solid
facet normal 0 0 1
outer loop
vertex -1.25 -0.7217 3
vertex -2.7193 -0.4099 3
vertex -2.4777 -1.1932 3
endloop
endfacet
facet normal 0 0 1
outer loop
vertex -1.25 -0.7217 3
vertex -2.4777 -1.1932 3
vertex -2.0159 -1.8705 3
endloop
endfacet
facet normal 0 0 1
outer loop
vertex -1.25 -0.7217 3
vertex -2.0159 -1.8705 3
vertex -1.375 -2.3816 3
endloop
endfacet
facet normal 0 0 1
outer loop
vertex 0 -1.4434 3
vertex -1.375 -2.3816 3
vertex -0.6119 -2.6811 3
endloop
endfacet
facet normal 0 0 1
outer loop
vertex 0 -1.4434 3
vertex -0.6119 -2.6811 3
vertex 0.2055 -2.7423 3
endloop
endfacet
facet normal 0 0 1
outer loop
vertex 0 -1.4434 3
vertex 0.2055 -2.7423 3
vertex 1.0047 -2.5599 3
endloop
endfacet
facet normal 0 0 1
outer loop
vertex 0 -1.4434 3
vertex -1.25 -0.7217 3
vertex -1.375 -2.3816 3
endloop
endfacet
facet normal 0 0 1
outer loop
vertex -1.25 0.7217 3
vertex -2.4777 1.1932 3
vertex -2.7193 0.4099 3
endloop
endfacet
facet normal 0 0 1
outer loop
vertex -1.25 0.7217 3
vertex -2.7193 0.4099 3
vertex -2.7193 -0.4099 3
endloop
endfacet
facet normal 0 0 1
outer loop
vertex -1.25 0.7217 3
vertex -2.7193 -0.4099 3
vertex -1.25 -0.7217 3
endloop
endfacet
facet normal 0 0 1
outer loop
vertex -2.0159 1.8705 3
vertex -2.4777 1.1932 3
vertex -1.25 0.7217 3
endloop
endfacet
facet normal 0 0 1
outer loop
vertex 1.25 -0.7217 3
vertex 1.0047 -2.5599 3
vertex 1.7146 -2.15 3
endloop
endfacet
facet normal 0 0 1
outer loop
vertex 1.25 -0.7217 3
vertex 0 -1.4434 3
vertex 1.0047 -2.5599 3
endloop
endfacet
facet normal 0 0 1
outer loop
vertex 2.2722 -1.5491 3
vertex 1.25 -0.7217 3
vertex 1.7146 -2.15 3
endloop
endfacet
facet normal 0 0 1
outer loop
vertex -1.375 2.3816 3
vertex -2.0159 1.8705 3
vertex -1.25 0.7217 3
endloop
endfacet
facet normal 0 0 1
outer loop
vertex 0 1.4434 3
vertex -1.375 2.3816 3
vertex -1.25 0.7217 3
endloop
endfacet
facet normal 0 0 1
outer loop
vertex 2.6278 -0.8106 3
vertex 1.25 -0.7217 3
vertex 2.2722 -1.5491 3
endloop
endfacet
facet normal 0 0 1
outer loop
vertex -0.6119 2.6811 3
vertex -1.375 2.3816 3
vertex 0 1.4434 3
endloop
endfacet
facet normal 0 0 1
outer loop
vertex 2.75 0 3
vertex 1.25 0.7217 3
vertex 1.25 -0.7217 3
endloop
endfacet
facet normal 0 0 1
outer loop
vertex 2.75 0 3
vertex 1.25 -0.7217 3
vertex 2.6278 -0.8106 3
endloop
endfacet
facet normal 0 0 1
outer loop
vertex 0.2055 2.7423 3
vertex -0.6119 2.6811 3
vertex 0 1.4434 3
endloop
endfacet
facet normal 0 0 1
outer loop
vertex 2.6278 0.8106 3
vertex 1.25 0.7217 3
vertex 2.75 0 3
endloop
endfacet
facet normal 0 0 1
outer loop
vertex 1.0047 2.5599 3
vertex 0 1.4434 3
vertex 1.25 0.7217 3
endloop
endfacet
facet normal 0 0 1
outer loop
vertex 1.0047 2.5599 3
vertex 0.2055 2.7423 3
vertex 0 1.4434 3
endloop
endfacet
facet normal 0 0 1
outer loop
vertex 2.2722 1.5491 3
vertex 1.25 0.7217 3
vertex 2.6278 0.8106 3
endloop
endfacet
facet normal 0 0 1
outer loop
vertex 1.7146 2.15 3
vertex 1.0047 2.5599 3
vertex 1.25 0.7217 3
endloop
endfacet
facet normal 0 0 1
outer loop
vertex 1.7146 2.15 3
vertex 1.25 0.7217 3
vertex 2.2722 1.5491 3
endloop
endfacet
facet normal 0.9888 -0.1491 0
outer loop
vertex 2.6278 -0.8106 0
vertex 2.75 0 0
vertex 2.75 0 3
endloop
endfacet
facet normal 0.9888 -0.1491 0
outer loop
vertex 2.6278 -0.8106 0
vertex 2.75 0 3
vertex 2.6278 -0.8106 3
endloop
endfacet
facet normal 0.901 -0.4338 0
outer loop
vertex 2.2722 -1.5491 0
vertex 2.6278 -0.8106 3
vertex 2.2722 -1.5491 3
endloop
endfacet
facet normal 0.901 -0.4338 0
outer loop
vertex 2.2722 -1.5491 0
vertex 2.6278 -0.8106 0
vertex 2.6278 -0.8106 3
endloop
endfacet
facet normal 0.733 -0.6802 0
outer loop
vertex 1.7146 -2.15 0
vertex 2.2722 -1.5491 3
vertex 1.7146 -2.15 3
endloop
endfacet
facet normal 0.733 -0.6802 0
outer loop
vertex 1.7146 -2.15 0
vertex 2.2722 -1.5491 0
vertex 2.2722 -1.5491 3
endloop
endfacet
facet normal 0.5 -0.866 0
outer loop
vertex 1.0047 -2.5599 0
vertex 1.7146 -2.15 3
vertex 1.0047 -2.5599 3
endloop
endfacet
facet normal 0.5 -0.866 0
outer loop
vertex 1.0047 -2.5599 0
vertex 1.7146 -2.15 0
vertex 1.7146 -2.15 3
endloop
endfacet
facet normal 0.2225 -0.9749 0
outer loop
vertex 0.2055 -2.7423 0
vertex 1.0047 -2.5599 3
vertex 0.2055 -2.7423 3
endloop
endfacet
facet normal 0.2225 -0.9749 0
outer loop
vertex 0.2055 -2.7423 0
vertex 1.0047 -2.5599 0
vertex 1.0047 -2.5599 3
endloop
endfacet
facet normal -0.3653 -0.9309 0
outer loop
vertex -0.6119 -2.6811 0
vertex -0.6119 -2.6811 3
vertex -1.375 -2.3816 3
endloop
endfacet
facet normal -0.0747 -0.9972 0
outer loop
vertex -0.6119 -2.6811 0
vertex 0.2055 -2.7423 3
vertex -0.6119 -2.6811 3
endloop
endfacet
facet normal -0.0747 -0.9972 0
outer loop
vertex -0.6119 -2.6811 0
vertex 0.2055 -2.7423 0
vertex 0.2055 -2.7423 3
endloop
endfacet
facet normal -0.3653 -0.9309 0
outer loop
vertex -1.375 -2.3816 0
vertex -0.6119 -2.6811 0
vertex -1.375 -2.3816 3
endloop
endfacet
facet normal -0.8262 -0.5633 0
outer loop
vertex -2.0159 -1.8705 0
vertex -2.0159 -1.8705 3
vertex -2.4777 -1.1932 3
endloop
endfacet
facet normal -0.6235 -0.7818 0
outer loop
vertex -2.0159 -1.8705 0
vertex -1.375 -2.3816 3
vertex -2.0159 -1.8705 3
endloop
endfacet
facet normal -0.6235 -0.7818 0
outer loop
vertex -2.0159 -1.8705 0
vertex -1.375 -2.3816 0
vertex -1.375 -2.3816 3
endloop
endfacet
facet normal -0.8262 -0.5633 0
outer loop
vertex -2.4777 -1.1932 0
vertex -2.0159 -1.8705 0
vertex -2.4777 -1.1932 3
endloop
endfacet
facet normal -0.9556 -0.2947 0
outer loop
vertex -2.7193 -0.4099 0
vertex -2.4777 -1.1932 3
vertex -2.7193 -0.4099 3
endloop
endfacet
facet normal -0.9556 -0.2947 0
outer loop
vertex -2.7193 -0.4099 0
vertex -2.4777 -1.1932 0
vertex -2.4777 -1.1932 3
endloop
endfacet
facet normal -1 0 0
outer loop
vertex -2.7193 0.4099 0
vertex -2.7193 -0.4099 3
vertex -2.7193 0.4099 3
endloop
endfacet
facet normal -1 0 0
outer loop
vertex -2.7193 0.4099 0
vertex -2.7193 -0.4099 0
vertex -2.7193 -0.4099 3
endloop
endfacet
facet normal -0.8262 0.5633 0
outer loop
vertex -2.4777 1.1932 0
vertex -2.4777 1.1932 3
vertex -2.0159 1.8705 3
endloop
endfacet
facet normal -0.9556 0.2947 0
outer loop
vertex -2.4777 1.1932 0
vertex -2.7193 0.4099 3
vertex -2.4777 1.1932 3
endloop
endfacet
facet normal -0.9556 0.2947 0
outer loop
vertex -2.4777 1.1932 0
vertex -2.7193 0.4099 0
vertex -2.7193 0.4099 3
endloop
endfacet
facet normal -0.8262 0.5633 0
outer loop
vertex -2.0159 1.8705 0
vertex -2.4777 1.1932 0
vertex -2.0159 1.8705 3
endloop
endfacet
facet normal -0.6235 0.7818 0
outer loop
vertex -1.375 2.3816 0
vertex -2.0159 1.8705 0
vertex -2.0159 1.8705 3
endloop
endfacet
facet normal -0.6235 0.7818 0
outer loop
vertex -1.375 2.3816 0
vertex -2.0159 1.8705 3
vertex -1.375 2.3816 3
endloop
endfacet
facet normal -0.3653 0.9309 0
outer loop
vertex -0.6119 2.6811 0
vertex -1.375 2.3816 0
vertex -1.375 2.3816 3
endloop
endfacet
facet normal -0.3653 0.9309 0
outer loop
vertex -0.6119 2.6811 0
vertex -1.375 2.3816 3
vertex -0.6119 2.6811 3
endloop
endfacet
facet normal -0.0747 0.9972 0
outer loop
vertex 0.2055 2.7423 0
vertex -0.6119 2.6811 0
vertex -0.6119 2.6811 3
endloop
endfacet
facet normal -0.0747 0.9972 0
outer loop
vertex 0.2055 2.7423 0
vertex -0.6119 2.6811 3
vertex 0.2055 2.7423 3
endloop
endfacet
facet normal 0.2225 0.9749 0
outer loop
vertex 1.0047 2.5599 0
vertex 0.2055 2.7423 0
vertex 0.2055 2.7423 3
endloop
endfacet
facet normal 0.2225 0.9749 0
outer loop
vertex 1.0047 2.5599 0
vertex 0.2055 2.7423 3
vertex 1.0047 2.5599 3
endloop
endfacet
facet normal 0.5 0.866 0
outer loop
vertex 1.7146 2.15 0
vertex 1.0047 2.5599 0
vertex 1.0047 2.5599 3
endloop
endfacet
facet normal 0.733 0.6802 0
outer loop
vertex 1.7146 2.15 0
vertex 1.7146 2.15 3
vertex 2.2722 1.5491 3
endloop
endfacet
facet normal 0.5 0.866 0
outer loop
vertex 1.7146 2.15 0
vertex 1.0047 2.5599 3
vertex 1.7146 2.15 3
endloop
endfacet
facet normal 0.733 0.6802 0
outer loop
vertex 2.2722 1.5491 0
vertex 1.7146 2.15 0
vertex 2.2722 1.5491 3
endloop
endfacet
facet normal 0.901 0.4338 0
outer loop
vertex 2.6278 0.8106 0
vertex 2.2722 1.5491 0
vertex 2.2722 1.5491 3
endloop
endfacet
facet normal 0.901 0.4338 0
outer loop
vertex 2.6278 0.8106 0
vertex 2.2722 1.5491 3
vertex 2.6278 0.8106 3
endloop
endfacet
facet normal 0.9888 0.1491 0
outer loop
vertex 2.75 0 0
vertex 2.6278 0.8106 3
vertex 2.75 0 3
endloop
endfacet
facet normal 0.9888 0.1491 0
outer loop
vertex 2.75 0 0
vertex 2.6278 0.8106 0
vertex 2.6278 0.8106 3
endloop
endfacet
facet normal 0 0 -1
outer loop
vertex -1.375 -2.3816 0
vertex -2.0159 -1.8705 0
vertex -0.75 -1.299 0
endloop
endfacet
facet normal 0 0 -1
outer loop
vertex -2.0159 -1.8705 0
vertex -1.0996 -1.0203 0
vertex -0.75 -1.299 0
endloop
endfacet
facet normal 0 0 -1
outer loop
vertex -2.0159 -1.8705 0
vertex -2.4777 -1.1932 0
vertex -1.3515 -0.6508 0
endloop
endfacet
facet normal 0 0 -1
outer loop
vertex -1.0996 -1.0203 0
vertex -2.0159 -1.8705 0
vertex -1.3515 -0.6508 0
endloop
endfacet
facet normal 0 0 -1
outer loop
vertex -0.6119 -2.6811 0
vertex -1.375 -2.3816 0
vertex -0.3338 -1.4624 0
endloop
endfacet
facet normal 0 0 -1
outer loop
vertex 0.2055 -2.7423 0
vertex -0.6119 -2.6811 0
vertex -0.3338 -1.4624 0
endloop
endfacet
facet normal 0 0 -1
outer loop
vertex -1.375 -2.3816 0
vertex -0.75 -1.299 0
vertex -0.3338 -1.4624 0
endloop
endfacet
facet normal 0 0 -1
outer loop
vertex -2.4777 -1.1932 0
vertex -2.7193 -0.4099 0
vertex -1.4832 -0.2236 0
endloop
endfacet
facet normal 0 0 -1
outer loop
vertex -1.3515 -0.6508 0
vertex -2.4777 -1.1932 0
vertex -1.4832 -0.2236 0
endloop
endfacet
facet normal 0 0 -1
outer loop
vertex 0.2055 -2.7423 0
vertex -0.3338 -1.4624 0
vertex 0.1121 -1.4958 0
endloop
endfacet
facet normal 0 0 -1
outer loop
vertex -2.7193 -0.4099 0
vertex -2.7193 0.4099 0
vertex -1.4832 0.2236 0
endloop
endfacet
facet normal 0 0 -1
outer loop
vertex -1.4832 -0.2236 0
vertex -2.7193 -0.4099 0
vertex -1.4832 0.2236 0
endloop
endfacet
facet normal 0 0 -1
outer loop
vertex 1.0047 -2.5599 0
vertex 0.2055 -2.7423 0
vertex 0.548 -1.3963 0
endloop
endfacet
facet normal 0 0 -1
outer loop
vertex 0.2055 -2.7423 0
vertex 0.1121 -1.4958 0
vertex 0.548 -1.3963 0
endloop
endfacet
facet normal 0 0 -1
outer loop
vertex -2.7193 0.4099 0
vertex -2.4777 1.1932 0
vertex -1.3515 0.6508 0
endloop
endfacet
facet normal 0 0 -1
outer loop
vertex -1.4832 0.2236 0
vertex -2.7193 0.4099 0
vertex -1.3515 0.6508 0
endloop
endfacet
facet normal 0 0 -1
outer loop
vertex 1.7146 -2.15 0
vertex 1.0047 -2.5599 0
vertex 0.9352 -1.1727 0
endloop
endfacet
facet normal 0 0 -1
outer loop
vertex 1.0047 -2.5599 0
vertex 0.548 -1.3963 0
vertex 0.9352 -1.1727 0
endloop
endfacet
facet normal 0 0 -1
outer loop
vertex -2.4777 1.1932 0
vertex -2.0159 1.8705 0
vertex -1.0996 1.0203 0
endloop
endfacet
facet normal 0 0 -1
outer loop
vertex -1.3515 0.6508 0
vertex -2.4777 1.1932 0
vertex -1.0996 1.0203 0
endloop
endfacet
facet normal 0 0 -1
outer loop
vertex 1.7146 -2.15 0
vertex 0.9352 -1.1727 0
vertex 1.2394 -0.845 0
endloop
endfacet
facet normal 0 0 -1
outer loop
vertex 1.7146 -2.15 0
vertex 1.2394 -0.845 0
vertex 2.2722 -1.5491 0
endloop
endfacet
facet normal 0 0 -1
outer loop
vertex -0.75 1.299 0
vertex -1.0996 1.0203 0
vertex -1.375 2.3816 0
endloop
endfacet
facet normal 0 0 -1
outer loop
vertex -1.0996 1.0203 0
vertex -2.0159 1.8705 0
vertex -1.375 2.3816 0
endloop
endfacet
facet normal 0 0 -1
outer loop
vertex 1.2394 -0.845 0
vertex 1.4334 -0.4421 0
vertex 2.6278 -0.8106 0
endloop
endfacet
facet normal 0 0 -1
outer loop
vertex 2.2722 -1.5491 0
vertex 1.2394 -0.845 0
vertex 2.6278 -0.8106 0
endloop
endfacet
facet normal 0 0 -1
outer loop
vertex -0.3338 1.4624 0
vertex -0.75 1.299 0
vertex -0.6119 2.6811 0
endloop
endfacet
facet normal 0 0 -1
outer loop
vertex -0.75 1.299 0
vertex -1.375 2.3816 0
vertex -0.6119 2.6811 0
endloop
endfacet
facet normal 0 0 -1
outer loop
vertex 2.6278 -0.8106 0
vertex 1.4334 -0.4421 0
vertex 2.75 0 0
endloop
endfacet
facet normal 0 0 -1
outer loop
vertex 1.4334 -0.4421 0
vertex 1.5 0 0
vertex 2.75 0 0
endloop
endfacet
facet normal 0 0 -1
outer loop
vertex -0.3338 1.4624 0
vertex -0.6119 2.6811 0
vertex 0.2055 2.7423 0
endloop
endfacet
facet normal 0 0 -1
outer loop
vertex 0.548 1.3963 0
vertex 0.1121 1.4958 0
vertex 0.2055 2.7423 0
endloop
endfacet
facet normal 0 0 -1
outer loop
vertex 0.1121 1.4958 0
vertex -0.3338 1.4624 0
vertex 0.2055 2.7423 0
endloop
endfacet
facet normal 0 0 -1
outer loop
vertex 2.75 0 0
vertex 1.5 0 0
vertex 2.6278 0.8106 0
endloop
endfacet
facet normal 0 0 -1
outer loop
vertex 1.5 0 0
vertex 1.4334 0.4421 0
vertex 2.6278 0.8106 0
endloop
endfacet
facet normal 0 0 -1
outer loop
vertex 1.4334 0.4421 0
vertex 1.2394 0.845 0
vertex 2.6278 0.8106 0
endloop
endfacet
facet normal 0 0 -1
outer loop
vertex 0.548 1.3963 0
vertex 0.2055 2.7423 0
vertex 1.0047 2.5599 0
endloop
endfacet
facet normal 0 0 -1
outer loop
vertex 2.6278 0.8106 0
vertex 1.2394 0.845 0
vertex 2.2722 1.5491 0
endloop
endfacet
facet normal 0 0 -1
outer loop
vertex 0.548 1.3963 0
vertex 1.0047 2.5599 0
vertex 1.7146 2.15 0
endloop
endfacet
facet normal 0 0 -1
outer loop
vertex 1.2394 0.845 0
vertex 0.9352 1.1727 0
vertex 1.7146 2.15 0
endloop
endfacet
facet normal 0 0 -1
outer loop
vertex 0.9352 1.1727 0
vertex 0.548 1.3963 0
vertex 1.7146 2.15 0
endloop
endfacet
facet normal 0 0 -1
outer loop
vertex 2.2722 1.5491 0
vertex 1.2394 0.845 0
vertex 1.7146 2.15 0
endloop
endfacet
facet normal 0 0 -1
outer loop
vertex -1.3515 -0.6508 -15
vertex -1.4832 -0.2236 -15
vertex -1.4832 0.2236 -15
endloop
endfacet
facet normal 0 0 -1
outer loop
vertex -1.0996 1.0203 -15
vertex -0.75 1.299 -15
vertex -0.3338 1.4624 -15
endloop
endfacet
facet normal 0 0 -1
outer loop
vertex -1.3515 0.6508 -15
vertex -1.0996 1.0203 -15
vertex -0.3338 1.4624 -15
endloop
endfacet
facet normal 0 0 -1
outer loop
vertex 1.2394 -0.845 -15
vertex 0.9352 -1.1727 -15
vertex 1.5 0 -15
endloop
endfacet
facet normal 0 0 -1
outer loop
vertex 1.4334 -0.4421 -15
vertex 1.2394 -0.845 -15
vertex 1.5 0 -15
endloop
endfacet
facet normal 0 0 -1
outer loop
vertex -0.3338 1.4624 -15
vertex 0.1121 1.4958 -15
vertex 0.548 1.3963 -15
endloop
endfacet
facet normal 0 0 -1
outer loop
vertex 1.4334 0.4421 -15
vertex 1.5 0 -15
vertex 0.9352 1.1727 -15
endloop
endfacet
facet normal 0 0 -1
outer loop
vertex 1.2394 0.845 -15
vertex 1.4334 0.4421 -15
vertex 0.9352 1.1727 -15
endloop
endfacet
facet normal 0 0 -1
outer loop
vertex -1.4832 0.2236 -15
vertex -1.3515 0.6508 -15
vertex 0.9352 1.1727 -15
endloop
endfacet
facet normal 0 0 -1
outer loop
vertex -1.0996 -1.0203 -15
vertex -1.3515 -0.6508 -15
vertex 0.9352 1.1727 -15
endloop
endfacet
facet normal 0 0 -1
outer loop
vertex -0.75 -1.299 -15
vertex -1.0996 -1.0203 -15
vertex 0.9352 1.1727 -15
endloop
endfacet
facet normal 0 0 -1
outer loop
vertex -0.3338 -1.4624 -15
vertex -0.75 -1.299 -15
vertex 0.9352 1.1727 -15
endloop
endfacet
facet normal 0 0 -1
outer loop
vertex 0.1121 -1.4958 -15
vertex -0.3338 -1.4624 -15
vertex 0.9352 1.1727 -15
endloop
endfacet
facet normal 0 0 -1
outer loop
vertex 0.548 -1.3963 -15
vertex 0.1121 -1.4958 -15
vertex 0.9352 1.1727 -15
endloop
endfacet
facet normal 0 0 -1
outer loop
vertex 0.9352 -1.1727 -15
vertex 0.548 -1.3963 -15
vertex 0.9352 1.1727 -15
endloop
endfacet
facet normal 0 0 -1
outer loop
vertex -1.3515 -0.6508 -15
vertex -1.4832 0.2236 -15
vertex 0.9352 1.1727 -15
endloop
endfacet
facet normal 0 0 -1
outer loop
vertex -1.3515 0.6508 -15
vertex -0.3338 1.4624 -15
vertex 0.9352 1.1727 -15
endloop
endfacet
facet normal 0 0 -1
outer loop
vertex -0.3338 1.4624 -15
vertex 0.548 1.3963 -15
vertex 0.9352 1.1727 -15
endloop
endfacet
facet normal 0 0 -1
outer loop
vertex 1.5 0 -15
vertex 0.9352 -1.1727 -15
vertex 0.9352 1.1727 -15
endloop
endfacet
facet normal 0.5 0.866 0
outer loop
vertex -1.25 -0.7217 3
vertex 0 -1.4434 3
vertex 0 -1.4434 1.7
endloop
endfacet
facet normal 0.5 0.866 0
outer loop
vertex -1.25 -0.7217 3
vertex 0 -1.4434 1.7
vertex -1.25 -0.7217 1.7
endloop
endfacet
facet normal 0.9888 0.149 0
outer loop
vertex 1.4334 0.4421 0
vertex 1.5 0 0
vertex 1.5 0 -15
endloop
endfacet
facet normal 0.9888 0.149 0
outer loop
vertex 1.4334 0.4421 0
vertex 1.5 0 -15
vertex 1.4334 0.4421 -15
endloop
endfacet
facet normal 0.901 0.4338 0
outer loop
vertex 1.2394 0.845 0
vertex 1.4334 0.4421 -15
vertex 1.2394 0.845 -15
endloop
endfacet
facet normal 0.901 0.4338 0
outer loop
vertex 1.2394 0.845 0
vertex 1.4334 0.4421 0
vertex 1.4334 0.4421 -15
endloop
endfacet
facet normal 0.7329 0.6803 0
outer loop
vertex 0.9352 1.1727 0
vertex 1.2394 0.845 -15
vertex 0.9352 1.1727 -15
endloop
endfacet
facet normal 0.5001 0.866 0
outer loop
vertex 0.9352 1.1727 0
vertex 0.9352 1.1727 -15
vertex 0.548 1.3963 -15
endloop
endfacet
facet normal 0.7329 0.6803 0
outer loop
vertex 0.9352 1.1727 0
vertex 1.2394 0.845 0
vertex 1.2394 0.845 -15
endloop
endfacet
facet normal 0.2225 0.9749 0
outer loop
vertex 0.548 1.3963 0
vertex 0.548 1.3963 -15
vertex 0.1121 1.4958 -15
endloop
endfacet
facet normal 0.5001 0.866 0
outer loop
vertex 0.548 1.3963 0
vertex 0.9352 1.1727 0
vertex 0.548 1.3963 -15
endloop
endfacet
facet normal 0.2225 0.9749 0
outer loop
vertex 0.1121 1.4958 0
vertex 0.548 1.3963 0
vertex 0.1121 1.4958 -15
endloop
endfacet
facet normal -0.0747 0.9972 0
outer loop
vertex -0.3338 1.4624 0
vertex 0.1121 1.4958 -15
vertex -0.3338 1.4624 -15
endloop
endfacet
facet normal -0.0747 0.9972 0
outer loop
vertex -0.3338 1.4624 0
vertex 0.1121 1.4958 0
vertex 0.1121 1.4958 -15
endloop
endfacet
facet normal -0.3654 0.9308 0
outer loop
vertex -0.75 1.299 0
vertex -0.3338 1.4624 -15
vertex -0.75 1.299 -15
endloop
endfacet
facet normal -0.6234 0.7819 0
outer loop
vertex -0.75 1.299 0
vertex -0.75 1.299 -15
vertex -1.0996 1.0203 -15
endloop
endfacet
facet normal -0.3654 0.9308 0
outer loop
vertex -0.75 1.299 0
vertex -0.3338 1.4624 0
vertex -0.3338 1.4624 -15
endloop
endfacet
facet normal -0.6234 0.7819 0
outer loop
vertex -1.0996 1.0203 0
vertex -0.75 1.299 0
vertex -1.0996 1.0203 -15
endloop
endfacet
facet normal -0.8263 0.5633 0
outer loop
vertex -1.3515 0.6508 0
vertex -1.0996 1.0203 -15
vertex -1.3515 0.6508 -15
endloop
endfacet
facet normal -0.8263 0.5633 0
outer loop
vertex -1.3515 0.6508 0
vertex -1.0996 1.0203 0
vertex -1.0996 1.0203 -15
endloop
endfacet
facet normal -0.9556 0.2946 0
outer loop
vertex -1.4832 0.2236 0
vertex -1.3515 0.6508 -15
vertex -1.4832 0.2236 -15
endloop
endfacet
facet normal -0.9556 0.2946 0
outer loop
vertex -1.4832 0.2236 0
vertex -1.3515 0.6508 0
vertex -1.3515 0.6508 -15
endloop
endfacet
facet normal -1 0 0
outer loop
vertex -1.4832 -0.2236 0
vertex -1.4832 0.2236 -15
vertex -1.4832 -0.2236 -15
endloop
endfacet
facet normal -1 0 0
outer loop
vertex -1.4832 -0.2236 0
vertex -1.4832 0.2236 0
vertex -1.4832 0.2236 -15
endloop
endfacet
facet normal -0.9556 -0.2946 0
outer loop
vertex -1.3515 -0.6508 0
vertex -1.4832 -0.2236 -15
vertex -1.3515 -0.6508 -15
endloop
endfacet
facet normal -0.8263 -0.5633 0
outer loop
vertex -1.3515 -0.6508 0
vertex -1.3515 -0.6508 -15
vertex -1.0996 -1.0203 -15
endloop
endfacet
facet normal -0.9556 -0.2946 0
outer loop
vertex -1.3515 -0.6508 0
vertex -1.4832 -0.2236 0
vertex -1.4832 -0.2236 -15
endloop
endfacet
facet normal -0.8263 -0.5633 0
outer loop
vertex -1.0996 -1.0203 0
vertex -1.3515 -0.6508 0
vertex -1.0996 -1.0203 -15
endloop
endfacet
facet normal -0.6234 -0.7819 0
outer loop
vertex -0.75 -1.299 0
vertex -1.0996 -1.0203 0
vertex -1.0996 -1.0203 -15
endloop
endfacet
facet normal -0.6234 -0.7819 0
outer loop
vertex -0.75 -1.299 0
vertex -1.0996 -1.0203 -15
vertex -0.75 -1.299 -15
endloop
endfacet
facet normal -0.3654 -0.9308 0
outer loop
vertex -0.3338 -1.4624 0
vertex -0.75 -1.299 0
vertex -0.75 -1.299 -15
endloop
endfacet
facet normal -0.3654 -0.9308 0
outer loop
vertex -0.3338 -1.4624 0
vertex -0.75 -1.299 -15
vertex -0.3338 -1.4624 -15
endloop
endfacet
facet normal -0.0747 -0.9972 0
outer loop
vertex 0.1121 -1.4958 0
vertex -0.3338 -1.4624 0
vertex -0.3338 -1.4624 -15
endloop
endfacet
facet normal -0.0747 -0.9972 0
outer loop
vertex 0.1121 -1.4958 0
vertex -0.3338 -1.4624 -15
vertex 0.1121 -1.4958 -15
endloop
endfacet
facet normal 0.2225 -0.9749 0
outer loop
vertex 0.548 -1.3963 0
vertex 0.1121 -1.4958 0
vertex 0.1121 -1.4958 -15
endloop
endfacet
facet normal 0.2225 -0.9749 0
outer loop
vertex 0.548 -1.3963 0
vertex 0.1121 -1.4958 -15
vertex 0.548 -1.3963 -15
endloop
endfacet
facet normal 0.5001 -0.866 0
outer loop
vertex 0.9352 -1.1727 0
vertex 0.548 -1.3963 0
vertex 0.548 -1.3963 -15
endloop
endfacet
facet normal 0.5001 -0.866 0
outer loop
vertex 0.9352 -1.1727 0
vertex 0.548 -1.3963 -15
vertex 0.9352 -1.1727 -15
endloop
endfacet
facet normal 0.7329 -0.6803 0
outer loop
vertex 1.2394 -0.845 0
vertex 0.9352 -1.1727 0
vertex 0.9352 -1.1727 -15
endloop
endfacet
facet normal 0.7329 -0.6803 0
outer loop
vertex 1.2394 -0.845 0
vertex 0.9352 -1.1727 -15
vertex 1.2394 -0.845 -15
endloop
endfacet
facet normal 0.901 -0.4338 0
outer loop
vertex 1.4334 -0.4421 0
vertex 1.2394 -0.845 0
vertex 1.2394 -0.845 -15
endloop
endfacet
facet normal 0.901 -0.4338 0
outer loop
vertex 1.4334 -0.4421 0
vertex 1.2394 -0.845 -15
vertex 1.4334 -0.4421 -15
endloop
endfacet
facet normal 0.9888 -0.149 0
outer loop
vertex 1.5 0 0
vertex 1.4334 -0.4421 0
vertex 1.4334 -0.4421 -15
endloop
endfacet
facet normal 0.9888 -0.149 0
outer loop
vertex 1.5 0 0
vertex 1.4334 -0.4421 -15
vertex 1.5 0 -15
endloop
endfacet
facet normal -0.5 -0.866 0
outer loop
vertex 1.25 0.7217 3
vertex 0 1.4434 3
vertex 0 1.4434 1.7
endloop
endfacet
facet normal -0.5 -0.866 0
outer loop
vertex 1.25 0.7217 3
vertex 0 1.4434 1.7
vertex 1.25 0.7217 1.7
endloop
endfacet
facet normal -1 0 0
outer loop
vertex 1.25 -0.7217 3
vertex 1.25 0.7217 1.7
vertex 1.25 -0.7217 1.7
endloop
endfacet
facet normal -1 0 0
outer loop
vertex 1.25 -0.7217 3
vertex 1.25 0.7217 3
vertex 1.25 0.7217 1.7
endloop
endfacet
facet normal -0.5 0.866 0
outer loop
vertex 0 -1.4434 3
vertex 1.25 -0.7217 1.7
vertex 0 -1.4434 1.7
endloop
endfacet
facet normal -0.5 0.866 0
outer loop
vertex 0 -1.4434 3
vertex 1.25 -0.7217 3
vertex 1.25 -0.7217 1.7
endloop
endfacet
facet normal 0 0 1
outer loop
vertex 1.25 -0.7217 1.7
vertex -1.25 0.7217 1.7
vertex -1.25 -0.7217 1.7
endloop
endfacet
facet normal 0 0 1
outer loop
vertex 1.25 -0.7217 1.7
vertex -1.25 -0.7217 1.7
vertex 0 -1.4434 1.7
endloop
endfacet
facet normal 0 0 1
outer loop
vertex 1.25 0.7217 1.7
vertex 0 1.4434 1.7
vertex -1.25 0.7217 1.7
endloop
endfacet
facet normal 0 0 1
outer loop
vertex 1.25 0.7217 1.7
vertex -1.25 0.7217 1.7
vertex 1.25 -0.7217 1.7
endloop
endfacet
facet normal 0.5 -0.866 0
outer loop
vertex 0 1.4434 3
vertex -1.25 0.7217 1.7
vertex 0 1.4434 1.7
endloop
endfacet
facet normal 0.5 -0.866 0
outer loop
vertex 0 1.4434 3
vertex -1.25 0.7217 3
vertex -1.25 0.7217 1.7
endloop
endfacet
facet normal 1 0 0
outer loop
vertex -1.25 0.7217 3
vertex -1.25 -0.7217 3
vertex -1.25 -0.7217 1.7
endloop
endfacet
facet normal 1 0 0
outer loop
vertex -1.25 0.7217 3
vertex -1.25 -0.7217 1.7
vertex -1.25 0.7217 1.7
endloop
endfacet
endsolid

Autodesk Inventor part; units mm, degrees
ref_plane "YZ Plane" through (0, 0, 0) normal (1, 0, 0) x (0, 1, 0)
ref_plane "XZ Plane" through (0, 0, 0) normal (0, 1, 0) x (-1, 0, 0)
ref_plane "XY Plane" through (0, 0, 0) normal (0, 0, 1) x (1, 0, 0)
sketch "スケッチ1" plane through (0, 0, 0) normal (0, 0, 1) x (1, 0, 0)
  circle A0 centre (0, 0) radius 1.5
  dimension "d0" = 3
extrude "押し出し1" add sketch "スケッチ1" against normal blind 15
sketch "スケッチ2" plane through (0, 0, 0) normal (0, 0, 1) x (1, 0, 0)
  circle A0 centre (0, 0) radius 2.75
  dimension "d3" = 5.5
extrude "押し出し2" add sketch "スケッチ2" along normal blind 3
sketch "スケッチ3" plane through (0, 0, 3) normal (0, 0, 1) x (1, 0, 0)
  line L0 (0, 1.4434) -> (1.25, 0.7217)
  line L1 (1.25, 0.7217) -> (1.25, -0.7217)
  line L2 (1.25, -0.7217) -> (0, -1.4434)
  line L3 (0, -1.4434) -> (-1.25, -0.7217)
  line L4 (-1.25, -0.7217) -> (-1.25, 0.7217)
  line L5 (-1.25, 0.7217) -> (0, 1.4434)
  point P0 (0, 0)
  point P1 (0, 0)
  dimension "d6" = 2.5
extrude "押し出し3" cut sketch "スケッチ3" against normal blind 1.3
thread "ねじ1" size "M3x0.5" class "6g" standard "ANSI Metric M Profile" full length
properties part number "M3キャップボルト 15" material "鋼、高強度、低合金"
